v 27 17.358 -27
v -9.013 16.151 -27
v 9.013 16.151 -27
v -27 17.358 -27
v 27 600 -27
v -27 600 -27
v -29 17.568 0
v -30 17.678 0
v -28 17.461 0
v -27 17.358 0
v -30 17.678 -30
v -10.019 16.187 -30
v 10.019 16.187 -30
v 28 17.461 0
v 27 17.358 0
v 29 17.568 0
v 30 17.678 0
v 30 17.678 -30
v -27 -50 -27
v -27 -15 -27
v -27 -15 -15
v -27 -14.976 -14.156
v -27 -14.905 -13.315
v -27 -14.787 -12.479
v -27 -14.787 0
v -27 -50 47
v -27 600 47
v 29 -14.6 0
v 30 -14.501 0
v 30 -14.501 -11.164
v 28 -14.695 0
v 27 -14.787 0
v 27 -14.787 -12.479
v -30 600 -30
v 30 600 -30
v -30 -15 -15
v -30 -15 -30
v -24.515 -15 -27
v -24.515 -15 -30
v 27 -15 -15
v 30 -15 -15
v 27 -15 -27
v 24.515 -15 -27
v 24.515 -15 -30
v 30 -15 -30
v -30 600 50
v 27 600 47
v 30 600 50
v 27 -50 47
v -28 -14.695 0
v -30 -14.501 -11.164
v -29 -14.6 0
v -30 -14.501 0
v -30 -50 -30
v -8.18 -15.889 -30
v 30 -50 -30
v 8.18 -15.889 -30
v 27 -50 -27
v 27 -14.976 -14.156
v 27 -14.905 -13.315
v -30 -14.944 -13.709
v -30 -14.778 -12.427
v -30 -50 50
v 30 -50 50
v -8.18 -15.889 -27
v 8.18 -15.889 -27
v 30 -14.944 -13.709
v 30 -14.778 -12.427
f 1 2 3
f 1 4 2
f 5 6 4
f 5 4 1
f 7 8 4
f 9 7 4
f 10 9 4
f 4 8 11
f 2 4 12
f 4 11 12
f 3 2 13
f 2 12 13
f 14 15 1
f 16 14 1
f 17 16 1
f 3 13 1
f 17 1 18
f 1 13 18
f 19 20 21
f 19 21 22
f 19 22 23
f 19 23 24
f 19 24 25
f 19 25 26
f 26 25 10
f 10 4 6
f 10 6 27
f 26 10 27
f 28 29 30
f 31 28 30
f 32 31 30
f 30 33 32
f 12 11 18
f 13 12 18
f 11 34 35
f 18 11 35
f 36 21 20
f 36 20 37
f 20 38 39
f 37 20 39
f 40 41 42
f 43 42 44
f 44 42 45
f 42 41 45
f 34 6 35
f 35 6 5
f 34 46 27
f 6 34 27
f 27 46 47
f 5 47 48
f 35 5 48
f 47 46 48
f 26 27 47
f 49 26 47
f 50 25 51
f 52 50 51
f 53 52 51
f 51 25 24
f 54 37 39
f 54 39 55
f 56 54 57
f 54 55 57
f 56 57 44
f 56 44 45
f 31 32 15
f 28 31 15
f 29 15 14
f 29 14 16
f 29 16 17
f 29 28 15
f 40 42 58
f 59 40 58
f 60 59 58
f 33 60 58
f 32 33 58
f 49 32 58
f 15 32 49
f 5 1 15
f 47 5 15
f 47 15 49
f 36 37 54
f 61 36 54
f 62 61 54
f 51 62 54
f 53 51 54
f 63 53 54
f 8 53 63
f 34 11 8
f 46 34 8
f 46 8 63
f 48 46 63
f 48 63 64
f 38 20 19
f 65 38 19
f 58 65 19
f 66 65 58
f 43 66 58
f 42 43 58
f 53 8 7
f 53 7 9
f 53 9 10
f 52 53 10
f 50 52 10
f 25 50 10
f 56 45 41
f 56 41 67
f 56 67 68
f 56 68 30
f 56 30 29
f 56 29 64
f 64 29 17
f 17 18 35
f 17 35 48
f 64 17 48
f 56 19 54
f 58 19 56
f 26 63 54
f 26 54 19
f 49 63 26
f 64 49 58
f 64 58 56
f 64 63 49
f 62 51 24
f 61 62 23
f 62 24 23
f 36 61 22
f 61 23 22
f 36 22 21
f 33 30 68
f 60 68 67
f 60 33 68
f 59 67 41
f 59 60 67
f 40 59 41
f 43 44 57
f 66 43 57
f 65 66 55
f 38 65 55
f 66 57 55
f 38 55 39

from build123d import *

# Parameters (mm, degrees)
F0_W          = 60
F0_H          = 80
F0_W_2        = 54
F0_H_2        = 74
F1_DEPTH      = 600
F1_DEPTH_BACK = 50
F3_DEPTH      = 30.001
F3_DEPTH_BACK = 30.001
F5_DEPTH      = 30


with BuildPart() as f1:
    # F0 (on Front) → F1 (new body, two sides)
    with BuildSketch(Plane.XZ) as f1_sk:
        with Locations((0, 10)):
            Rectangle(F0_W, F0_H)
        with Locations((0, 10)):
            Rectangle(F0_W_2, F0_H_2, mode=Mode.SUBTRACT)
    extrude(amount=-F1_DEPTH)
    extrude(f1_sk.sketch, amount=F1_DEPTH_BACK)

    # F2 (on Right) → F3 (cut, two sides)
    with BuildSketch(Plane.YZ) as f3_sk:
        with BuildLine():
            Line((15, -30), (15, -15))
            ThreePointArc((15, -15), (0, 0), (-15, -15))
            Line((-15, -15), (-15, -30))
            Line((-15, -30), (15, -30))
        make_face()
    extrude(amount=-F3_DEPTH, mode=Mode.SUBTRACT)
    extrude(f3_sk.sketch, amount=F3_DEPTH_BACK, mode=Mode.SUBTRACT)

    # F4 (on face) → F5 (cut)
    with BuildSketch(Plane(origin=(0, 0, -30), x_dir=(1, 0, 0), z_dir=(0, 0, -1))):
        with BuildLine():
            Line((30, -17.67809667), (30, 14.5012520842))
            ThreePointArc((30, 14.5012520842), (0, 16), (-30, 14.5012520842))
            Line((-30, 14.5012520842), (-30, -17.67809667))
            ThreePointArc((-30, -17.67809667), (0, -16), (30, -17.67809667))
        make_face()
    extrude(amount=-F5_DEPTH, mode=Mode.SUBTRACT)


solid = f1.part
